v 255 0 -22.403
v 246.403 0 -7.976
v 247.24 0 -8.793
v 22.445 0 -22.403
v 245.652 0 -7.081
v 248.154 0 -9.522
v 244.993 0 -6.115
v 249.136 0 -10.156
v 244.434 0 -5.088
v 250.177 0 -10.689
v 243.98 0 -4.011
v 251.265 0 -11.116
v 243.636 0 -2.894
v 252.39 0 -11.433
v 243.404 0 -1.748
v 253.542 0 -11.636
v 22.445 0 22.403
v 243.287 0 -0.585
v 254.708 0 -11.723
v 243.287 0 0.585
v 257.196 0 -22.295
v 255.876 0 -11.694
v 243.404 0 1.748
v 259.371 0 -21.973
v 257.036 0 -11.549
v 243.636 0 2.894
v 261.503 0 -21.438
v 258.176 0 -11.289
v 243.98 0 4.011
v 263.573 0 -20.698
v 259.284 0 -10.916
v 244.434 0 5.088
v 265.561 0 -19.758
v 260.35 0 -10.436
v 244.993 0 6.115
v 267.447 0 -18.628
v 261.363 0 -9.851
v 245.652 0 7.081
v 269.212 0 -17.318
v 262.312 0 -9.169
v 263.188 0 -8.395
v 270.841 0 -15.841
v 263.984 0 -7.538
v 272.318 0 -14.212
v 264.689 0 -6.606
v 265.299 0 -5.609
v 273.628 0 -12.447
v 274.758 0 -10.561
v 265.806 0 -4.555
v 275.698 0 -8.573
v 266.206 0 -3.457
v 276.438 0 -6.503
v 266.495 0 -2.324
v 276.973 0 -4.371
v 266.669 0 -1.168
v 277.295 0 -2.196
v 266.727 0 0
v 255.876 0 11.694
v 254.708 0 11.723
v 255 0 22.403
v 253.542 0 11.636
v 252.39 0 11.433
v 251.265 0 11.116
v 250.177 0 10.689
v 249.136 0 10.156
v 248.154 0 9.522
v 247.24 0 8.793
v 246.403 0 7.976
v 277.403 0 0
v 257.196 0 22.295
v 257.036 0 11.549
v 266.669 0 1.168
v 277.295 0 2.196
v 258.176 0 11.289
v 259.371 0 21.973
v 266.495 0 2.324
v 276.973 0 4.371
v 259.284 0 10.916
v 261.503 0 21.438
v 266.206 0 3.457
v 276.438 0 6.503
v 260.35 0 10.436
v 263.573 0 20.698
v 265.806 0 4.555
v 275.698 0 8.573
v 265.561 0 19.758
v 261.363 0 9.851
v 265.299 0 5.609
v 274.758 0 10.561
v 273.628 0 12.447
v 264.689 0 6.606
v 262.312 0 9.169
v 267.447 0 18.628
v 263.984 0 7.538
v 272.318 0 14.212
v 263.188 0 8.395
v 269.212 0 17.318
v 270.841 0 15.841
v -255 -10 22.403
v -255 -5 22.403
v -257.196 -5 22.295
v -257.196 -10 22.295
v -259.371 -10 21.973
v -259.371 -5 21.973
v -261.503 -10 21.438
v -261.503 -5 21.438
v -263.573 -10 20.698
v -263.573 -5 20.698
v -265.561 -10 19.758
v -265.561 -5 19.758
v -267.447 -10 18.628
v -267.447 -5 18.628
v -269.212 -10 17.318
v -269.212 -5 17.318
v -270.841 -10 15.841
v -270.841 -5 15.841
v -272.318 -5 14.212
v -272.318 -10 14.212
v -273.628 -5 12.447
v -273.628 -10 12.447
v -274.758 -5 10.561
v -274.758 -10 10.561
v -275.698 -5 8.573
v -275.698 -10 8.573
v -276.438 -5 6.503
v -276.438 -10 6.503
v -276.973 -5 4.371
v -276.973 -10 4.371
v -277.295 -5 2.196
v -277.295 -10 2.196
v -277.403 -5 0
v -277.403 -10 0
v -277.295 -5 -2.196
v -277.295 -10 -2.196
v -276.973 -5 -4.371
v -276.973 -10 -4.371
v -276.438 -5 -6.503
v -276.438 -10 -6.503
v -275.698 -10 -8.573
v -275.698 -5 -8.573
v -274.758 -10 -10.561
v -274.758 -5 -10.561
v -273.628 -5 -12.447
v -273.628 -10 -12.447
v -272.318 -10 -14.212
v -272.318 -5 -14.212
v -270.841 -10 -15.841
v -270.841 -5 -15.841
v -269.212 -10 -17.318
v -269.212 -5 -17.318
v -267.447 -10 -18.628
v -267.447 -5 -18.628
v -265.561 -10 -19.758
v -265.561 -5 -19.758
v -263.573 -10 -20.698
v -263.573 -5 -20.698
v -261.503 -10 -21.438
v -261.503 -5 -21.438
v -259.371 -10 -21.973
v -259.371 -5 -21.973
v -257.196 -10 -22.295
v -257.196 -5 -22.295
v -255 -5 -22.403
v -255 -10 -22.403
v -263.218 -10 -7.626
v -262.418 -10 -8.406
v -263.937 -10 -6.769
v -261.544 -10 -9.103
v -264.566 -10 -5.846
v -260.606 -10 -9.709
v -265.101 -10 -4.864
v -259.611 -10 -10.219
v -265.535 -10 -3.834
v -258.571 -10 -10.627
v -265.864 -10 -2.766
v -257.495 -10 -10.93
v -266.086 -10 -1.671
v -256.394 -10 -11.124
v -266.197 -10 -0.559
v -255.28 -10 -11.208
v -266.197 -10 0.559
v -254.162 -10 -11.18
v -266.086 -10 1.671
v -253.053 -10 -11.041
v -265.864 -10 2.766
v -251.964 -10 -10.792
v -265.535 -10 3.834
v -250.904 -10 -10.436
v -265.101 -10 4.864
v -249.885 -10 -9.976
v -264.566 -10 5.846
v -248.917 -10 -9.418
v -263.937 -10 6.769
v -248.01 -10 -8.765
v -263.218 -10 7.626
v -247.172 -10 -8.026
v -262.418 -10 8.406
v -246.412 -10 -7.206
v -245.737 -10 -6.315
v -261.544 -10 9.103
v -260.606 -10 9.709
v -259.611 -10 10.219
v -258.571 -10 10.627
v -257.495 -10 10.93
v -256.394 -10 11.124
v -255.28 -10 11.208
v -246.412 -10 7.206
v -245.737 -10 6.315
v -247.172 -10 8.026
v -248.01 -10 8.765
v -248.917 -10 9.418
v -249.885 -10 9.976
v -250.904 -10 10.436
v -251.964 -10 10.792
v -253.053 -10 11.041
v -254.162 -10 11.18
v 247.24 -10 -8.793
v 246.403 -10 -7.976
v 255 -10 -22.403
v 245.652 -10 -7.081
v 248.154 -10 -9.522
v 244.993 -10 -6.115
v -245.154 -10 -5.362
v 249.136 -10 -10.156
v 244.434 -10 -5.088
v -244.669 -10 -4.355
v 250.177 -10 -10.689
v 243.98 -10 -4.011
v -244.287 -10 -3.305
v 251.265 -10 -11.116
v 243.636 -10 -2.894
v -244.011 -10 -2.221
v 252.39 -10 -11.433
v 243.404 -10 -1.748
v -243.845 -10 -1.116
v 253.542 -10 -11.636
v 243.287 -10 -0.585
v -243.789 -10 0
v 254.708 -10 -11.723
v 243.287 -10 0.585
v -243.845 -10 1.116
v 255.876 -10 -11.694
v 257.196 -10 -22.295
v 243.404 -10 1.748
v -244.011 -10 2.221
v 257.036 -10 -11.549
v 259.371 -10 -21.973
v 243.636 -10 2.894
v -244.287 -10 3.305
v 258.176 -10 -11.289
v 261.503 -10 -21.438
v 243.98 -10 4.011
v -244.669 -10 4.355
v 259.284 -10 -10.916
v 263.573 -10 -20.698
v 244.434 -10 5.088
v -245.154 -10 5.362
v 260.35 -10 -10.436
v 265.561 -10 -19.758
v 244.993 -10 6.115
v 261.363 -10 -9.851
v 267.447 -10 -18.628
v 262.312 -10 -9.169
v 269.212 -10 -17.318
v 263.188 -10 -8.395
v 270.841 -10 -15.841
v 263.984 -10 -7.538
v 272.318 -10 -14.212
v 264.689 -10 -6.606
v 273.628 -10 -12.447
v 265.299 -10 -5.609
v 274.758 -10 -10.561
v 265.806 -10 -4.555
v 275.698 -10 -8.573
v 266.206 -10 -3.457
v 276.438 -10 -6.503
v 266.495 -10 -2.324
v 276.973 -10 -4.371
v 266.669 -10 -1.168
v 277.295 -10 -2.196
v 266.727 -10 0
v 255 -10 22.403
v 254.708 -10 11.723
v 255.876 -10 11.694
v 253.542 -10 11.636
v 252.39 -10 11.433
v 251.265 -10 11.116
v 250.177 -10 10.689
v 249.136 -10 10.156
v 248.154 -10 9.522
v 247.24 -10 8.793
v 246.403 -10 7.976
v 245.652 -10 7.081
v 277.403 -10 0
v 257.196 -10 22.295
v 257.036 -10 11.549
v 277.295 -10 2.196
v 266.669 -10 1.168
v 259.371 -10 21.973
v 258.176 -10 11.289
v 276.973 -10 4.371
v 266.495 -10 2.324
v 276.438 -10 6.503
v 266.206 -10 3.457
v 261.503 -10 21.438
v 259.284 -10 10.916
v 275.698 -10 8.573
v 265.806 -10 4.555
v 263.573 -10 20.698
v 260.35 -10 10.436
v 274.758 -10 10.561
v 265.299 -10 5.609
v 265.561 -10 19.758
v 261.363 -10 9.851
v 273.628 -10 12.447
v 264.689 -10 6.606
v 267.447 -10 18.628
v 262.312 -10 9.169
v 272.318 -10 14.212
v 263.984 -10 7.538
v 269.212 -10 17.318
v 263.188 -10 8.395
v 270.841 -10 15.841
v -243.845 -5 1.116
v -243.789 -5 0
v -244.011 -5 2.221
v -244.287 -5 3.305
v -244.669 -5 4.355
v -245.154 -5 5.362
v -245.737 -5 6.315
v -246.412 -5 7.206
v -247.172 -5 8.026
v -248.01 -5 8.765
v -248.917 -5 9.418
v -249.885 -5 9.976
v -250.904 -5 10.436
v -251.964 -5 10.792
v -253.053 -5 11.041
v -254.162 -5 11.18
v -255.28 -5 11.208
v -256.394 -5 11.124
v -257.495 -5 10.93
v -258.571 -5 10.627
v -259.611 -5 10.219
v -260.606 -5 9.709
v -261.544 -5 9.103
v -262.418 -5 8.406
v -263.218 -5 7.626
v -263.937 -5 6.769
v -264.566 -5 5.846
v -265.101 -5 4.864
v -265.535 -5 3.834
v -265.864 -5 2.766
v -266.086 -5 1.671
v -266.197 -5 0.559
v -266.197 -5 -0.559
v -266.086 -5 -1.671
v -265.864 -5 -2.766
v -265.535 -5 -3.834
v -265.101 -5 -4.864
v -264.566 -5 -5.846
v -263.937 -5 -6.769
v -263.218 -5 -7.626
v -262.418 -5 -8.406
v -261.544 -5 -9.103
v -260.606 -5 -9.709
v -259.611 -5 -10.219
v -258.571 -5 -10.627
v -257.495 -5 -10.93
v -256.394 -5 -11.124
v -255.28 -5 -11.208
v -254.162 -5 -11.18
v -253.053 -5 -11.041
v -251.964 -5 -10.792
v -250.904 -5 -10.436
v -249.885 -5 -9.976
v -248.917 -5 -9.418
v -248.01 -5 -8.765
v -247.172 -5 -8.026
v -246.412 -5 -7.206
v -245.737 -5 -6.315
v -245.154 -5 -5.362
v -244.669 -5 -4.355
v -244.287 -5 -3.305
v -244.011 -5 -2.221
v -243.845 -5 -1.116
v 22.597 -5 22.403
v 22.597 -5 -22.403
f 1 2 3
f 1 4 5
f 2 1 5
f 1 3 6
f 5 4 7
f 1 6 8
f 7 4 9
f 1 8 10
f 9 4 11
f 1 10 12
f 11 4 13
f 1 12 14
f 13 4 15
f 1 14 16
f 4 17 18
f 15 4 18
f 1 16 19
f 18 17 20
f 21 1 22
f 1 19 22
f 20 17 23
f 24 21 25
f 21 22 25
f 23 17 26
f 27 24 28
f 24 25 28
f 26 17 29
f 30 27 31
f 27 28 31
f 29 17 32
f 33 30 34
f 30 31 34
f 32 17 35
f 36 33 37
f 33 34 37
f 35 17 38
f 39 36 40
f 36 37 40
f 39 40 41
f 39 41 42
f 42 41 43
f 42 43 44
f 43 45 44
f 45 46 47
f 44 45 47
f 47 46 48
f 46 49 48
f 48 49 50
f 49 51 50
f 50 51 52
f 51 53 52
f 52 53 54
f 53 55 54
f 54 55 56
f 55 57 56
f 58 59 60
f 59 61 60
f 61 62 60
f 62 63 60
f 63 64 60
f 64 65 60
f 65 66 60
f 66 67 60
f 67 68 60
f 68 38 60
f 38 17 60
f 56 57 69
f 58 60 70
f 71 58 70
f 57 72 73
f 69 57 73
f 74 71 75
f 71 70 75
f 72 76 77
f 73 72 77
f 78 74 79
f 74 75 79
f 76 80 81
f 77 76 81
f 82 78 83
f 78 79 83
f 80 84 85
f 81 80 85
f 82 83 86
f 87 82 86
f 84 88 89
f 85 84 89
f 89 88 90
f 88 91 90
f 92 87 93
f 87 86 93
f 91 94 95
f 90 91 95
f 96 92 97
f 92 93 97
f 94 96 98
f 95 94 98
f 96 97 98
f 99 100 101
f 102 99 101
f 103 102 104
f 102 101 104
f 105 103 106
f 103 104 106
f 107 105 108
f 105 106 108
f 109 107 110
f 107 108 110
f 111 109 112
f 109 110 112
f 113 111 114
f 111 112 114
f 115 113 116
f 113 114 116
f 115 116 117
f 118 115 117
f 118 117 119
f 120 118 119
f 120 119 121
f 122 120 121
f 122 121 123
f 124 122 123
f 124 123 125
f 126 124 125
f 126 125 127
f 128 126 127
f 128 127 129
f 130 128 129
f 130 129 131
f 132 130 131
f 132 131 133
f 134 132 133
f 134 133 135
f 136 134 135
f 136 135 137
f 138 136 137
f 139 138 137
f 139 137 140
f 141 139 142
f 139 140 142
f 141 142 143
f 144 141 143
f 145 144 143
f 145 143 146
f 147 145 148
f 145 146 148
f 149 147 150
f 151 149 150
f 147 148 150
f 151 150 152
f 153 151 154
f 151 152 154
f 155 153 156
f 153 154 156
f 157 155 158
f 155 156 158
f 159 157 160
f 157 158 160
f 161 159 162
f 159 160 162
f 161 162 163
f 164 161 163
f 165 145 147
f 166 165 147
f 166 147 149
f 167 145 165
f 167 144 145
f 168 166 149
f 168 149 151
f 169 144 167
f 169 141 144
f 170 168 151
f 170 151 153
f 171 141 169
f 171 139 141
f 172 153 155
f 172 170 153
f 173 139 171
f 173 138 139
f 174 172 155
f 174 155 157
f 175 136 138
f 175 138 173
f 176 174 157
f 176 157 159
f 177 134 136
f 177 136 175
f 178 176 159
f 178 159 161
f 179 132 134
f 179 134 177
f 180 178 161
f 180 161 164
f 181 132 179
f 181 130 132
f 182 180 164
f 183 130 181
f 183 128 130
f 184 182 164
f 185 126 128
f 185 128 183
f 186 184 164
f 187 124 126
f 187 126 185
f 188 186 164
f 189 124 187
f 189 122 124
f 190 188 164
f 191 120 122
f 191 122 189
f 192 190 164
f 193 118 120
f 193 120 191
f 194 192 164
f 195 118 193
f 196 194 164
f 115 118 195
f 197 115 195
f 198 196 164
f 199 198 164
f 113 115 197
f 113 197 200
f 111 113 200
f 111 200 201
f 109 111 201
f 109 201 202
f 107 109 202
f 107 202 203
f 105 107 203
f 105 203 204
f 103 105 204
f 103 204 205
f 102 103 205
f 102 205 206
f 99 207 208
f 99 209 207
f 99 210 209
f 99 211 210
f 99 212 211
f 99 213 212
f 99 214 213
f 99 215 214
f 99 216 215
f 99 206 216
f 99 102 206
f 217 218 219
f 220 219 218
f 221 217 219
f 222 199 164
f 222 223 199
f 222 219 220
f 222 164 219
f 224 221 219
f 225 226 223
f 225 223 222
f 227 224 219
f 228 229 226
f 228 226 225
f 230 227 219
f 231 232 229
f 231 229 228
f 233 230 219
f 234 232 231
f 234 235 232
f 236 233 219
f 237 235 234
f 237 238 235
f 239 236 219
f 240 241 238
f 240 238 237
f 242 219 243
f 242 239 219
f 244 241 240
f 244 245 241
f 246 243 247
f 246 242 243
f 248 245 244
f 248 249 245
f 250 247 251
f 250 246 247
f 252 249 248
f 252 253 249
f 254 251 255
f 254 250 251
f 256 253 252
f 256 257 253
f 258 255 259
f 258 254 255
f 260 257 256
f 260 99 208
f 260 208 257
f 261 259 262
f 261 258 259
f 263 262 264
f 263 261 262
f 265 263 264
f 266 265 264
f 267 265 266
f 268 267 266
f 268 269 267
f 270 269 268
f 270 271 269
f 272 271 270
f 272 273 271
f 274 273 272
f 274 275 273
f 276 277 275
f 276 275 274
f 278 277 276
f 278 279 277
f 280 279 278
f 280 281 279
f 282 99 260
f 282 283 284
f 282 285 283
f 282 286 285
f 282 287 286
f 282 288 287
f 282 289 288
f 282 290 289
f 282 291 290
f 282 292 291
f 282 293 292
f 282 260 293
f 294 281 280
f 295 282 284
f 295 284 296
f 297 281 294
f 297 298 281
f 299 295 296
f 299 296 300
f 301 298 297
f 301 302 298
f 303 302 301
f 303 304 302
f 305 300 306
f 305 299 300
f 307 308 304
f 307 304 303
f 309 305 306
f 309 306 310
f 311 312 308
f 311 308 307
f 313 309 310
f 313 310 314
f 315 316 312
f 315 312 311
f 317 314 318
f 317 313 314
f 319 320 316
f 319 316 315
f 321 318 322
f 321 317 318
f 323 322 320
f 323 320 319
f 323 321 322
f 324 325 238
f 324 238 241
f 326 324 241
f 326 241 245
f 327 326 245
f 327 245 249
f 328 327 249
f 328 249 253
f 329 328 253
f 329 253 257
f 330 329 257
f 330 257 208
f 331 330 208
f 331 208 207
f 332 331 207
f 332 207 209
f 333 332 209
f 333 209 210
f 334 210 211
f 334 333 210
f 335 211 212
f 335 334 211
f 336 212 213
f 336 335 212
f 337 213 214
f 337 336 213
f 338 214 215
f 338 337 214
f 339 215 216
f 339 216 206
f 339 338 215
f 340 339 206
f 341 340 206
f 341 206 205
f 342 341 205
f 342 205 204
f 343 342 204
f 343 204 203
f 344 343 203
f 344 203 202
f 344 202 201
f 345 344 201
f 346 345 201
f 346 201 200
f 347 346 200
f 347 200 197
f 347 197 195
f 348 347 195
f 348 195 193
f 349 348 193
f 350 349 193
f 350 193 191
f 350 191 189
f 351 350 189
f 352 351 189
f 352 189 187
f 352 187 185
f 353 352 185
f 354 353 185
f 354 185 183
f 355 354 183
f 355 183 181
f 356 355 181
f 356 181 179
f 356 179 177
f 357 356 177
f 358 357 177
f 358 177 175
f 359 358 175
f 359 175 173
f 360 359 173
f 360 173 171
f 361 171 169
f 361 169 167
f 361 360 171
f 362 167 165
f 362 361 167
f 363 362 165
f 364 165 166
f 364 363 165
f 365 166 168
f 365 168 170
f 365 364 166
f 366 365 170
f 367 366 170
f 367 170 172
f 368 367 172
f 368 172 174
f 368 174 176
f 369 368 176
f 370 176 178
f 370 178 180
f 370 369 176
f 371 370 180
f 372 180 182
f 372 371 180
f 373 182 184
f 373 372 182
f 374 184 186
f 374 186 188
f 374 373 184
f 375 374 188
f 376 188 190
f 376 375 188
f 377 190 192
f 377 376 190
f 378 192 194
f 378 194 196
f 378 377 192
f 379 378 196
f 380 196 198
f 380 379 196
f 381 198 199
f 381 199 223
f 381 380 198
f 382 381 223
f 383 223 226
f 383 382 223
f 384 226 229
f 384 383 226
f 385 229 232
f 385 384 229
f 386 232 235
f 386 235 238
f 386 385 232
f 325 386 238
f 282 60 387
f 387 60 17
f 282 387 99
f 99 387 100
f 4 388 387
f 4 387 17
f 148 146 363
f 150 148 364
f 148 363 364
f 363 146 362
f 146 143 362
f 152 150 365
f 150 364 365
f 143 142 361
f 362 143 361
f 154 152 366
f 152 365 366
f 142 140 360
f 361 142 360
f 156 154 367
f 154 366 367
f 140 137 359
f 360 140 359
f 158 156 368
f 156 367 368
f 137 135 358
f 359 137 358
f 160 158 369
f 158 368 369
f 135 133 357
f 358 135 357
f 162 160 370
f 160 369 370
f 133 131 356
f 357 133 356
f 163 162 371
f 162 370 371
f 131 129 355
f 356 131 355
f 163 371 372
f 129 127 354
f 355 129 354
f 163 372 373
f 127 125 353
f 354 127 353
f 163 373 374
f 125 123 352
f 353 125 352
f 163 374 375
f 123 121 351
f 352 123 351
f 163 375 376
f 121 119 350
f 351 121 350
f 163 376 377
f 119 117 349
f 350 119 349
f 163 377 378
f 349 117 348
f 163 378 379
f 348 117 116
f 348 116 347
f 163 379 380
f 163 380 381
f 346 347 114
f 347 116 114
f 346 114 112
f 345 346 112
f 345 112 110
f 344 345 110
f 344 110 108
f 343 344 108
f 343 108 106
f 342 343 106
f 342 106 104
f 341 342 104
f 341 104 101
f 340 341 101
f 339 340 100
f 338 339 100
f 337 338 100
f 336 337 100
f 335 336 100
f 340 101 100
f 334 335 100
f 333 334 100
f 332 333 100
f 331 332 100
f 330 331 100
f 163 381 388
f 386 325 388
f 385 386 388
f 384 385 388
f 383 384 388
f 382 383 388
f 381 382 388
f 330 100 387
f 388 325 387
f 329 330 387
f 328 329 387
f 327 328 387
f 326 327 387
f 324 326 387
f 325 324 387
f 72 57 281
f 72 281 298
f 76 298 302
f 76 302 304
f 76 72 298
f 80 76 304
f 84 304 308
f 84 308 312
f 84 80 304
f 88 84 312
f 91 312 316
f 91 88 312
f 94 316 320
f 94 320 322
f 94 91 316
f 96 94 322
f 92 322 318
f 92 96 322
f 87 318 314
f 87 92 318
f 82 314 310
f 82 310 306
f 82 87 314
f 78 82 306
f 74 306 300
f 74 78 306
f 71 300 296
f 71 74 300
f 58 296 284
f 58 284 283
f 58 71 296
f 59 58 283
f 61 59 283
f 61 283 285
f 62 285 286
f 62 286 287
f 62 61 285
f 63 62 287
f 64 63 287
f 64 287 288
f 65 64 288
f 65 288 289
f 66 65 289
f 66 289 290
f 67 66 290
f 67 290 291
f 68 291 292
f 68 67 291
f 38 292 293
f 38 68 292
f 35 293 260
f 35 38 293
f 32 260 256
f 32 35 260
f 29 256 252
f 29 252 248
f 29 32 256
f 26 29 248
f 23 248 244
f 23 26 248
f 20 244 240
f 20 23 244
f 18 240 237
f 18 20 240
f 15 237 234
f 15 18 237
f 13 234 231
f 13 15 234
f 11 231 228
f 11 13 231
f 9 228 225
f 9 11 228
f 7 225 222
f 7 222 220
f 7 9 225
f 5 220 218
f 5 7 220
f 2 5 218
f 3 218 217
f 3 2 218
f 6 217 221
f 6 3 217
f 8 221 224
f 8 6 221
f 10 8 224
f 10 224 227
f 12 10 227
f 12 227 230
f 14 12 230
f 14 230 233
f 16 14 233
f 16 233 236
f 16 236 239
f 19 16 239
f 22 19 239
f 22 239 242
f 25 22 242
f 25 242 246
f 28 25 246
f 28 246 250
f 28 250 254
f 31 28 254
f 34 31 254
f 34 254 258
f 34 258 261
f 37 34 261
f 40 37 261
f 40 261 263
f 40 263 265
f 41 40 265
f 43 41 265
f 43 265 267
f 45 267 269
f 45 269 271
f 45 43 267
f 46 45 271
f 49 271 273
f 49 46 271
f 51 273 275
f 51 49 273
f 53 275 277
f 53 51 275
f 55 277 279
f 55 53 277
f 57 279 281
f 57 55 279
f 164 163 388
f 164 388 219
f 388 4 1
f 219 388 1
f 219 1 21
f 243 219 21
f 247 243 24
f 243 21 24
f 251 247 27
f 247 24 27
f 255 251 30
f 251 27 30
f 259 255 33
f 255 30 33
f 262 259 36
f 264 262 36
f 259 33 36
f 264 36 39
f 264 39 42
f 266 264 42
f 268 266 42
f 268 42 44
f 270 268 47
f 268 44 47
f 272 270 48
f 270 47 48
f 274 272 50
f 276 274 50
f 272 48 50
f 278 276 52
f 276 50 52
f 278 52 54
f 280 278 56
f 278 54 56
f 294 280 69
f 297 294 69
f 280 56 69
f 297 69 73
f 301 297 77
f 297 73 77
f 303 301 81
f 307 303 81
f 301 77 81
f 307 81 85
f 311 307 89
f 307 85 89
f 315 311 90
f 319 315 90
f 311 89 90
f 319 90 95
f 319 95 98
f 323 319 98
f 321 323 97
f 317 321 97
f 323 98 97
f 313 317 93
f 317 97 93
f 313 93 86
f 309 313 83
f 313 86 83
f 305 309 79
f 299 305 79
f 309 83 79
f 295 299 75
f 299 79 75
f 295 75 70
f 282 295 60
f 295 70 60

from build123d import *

# Parameters (mm, degrees)
F0_R     = 11.2111638742
F0_R_2   = 11.727131611
F1_DEPTH = 10
F2_W     = 22.4031397956
F2_H     = 5
F3_DEPTH = 150


with BuildPart() as f1:
    # F0 (on Front) → F1 (new body)
    with BuildSketch(Plane.XZ):
        with BuildLine():
            ThreePointArc((255, -22.4031397956), (277.4031397956, 0), (255, 22.4031397956))
            Line((255, 22.4031397956), (-255, 22.4031397956))
            ThreePointArc((-255, 22.4031397956), (-277.4031397956, 0), (-255, -22.4031397956))
            Line((-255, -22.4031397956), (255, -22.4031397956))
        make_face()
        with Locations((-255, 0)):
            Circle(F0_R, mode=Mode.SUBTRACT)
        with Locations((255, 0)):
            Circle(F0_R_2, mode=Mode.SUBTRACT)
    extrude(amount=F1_DEPTH)

    # F2 (on face) → F3 (cut)
    with BuildSketch(Plane.XY.offset(22.4031397956)):
        Polygon((-255, 0), (22.4446713773, 0), (22.1150012921, 10.8309555799), (-277.4031397956, 10.8309555799), (-277.4031397956, 0), align=None)
        Polygon((-255, -5), (22.5968602044, -5), (22.4446713773, 0), (-255, 0), align=None)
        with Locations((-266.2015698978, -2.5)):
            Rectangle(F2_W, F2_H)
    extrude(amount=-F3_DEPTH, mode=Mode.SUBTRACT)


solid = f1.part
